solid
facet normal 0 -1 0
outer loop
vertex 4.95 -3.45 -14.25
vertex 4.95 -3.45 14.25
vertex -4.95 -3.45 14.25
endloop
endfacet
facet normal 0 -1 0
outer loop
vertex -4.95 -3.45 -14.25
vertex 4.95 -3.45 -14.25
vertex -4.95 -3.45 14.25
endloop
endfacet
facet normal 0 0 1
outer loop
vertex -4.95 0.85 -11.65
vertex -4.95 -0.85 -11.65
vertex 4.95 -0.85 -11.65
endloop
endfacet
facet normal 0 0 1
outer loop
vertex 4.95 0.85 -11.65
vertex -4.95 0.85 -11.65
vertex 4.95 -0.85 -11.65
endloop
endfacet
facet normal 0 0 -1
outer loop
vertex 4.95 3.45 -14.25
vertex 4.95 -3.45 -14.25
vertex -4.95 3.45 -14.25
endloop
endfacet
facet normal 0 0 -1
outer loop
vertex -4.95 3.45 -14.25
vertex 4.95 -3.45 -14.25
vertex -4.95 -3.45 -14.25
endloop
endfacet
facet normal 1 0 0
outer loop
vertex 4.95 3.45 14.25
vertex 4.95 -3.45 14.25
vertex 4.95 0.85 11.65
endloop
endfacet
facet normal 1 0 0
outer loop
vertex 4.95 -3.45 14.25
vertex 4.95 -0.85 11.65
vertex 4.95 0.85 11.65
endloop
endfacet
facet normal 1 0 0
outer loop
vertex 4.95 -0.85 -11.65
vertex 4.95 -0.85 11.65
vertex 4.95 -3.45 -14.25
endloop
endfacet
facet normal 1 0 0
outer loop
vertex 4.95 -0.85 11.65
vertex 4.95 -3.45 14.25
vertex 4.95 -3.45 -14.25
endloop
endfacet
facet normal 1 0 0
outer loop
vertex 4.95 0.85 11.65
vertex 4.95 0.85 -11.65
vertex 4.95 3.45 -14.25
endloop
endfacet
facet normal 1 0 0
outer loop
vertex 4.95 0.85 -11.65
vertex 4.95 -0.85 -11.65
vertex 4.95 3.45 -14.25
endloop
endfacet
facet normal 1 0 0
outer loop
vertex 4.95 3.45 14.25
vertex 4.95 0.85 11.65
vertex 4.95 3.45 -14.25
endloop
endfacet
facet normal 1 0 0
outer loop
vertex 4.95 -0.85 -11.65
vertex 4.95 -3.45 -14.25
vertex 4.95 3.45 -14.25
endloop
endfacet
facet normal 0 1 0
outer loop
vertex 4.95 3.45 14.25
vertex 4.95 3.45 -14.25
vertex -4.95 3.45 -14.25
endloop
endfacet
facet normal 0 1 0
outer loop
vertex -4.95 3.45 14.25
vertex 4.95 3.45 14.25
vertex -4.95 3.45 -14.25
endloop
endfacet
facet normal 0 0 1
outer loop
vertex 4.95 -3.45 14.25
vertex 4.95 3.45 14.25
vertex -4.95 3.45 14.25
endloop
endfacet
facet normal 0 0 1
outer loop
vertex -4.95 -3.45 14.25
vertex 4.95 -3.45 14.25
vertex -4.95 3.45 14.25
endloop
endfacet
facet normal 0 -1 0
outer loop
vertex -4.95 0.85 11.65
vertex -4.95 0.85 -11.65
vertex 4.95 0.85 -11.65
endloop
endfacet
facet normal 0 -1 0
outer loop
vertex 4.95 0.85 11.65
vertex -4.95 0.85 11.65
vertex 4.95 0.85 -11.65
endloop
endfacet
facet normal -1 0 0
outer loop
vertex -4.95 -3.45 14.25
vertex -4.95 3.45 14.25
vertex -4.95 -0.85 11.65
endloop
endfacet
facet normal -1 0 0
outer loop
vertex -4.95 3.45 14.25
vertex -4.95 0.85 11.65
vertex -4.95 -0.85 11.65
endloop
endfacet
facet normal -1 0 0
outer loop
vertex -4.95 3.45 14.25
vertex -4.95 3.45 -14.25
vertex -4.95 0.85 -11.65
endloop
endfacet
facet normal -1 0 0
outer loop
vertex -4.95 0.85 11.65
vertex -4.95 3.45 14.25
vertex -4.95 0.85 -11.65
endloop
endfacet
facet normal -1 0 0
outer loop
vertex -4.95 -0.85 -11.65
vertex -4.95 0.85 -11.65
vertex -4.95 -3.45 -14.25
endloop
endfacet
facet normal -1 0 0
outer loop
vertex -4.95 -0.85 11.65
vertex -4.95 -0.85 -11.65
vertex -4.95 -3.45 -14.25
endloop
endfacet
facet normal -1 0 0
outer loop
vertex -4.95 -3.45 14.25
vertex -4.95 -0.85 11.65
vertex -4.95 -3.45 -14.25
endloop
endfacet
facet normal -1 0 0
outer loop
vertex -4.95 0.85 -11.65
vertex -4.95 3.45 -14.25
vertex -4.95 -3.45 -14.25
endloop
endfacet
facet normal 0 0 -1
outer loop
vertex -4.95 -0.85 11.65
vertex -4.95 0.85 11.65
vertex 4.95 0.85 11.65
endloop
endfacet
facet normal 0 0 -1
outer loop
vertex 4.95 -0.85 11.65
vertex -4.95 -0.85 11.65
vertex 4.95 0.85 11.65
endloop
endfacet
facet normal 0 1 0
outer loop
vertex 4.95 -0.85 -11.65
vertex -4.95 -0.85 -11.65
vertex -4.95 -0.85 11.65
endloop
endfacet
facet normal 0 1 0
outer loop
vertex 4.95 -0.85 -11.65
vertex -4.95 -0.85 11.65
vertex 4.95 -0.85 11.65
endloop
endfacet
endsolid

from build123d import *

# Parameters (mm, degrees)
CROSS_SECTION_W = 9.9
CROSS_SECTION_H = 2.6


with BuildPart() as part:
    # Sweep1: sweep along a path in path
    with BuildLine(Plane(origin=(0, 0, 0), x_dir=(0, 0, -1), z_dir=(1, 0, 0))) as sweep1_path:
        Line((-12.95, 2.15), (12.95, 2.15))
        Line((12.95, 2.15), (12.95, -2.15))
        Line((12.95, -2.15), (-12.95, -2.15))
        Line((-12.95, -2.15), (-12.95, 2.15))
    # cross-section → Sweep1 (sweep)
    with BuildSketch(Plane.XY):
        with Locations((0, 2.15)):
            Rectangle(CROSS_SECTION_W, CROSS_SECTION_H)
    sweep(path=sweep1_path.line, transition=Transition.RIGHT)


solid = part.part
